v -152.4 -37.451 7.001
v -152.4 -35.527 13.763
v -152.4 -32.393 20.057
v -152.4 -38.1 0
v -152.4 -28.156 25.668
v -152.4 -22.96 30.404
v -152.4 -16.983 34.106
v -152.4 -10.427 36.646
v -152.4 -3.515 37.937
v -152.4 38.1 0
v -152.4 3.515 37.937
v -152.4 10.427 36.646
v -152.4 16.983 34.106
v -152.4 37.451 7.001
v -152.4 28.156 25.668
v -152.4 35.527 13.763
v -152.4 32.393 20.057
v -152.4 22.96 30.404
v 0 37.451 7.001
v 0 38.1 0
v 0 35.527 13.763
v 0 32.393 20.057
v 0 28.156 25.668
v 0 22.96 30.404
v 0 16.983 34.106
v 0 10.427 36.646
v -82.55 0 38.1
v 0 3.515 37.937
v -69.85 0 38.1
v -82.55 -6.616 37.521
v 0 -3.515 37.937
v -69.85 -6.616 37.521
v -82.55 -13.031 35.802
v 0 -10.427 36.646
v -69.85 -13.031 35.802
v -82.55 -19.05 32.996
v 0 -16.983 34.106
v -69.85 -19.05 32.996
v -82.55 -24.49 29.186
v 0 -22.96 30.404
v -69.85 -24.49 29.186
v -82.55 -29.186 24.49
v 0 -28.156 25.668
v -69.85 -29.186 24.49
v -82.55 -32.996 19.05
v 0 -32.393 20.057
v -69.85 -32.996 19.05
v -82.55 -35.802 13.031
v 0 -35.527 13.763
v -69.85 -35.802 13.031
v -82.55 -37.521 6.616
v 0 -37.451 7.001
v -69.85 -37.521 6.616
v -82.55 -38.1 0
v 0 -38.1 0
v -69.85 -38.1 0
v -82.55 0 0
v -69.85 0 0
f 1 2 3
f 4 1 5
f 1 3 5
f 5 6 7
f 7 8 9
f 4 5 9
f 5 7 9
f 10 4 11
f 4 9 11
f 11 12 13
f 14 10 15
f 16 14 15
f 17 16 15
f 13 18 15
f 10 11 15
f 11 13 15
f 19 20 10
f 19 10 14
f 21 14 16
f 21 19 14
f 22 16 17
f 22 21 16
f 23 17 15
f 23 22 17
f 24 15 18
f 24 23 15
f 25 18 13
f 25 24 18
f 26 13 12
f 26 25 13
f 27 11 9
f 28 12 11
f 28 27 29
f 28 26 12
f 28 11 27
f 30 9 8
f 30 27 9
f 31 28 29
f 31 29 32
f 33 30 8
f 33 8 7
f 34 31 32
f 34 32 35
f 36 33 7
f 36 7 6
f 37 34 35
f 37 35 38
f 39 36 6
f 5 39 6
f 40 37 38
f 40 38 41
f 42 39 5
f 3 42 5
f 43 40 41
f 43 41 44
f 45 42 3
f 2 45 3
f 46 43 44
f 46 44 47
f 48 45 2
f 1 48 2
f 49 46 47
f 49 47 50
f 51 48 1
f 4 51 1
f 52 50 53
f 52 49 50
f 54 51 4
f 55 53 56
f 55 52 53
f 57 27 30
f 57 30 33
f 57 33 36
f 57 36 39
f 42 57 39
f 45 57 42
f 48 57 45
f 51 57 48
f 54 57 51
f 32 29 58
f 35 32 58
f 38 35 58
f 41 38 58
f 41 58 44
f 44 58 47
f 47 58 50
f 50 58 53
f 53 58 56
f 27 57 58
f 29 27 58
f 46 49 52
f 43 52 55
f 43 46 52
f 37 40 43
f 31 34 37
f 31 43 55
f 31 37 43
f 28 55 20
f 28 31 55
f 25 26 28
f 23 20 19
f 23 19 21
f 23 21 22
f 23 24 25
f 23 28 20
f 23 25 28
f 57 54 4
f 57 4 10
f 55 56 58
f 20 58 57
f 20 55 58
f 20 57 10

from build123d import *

# Parameters (mm, degrees)
F1_DEPTH = 152.4
F2_W     = 12.700002
F2_H     = 38.1
F3_DEPTH = 38.101


with BuildPart() as f1:
    # F0 (on Right) → F1 (new body)
    with BuildSketch(Plane.YZ):
        with BuildLine():
            Line((-38.1, 0), (38.1, 0))
            ThreePointArc((38.1, 0), (0, 38.1), (-38.1, 0))
        make_face()
    extrude(amount=-F1_DEPTH)

    # F2 (on face) → F3 (cut, through all)
    with BuildSketch(Plane(origin=(0, 0, 0), x_dir=(1, 0, 0), z_dir=(0, 0, -1))):
        with Locations((-76.199999, 19.05)):
            Rectangle(F2_W, F2_H)
    extrude(amount=-F3_DEPTH, mode=Mode.SUBTRACT)


solid = f1.part
